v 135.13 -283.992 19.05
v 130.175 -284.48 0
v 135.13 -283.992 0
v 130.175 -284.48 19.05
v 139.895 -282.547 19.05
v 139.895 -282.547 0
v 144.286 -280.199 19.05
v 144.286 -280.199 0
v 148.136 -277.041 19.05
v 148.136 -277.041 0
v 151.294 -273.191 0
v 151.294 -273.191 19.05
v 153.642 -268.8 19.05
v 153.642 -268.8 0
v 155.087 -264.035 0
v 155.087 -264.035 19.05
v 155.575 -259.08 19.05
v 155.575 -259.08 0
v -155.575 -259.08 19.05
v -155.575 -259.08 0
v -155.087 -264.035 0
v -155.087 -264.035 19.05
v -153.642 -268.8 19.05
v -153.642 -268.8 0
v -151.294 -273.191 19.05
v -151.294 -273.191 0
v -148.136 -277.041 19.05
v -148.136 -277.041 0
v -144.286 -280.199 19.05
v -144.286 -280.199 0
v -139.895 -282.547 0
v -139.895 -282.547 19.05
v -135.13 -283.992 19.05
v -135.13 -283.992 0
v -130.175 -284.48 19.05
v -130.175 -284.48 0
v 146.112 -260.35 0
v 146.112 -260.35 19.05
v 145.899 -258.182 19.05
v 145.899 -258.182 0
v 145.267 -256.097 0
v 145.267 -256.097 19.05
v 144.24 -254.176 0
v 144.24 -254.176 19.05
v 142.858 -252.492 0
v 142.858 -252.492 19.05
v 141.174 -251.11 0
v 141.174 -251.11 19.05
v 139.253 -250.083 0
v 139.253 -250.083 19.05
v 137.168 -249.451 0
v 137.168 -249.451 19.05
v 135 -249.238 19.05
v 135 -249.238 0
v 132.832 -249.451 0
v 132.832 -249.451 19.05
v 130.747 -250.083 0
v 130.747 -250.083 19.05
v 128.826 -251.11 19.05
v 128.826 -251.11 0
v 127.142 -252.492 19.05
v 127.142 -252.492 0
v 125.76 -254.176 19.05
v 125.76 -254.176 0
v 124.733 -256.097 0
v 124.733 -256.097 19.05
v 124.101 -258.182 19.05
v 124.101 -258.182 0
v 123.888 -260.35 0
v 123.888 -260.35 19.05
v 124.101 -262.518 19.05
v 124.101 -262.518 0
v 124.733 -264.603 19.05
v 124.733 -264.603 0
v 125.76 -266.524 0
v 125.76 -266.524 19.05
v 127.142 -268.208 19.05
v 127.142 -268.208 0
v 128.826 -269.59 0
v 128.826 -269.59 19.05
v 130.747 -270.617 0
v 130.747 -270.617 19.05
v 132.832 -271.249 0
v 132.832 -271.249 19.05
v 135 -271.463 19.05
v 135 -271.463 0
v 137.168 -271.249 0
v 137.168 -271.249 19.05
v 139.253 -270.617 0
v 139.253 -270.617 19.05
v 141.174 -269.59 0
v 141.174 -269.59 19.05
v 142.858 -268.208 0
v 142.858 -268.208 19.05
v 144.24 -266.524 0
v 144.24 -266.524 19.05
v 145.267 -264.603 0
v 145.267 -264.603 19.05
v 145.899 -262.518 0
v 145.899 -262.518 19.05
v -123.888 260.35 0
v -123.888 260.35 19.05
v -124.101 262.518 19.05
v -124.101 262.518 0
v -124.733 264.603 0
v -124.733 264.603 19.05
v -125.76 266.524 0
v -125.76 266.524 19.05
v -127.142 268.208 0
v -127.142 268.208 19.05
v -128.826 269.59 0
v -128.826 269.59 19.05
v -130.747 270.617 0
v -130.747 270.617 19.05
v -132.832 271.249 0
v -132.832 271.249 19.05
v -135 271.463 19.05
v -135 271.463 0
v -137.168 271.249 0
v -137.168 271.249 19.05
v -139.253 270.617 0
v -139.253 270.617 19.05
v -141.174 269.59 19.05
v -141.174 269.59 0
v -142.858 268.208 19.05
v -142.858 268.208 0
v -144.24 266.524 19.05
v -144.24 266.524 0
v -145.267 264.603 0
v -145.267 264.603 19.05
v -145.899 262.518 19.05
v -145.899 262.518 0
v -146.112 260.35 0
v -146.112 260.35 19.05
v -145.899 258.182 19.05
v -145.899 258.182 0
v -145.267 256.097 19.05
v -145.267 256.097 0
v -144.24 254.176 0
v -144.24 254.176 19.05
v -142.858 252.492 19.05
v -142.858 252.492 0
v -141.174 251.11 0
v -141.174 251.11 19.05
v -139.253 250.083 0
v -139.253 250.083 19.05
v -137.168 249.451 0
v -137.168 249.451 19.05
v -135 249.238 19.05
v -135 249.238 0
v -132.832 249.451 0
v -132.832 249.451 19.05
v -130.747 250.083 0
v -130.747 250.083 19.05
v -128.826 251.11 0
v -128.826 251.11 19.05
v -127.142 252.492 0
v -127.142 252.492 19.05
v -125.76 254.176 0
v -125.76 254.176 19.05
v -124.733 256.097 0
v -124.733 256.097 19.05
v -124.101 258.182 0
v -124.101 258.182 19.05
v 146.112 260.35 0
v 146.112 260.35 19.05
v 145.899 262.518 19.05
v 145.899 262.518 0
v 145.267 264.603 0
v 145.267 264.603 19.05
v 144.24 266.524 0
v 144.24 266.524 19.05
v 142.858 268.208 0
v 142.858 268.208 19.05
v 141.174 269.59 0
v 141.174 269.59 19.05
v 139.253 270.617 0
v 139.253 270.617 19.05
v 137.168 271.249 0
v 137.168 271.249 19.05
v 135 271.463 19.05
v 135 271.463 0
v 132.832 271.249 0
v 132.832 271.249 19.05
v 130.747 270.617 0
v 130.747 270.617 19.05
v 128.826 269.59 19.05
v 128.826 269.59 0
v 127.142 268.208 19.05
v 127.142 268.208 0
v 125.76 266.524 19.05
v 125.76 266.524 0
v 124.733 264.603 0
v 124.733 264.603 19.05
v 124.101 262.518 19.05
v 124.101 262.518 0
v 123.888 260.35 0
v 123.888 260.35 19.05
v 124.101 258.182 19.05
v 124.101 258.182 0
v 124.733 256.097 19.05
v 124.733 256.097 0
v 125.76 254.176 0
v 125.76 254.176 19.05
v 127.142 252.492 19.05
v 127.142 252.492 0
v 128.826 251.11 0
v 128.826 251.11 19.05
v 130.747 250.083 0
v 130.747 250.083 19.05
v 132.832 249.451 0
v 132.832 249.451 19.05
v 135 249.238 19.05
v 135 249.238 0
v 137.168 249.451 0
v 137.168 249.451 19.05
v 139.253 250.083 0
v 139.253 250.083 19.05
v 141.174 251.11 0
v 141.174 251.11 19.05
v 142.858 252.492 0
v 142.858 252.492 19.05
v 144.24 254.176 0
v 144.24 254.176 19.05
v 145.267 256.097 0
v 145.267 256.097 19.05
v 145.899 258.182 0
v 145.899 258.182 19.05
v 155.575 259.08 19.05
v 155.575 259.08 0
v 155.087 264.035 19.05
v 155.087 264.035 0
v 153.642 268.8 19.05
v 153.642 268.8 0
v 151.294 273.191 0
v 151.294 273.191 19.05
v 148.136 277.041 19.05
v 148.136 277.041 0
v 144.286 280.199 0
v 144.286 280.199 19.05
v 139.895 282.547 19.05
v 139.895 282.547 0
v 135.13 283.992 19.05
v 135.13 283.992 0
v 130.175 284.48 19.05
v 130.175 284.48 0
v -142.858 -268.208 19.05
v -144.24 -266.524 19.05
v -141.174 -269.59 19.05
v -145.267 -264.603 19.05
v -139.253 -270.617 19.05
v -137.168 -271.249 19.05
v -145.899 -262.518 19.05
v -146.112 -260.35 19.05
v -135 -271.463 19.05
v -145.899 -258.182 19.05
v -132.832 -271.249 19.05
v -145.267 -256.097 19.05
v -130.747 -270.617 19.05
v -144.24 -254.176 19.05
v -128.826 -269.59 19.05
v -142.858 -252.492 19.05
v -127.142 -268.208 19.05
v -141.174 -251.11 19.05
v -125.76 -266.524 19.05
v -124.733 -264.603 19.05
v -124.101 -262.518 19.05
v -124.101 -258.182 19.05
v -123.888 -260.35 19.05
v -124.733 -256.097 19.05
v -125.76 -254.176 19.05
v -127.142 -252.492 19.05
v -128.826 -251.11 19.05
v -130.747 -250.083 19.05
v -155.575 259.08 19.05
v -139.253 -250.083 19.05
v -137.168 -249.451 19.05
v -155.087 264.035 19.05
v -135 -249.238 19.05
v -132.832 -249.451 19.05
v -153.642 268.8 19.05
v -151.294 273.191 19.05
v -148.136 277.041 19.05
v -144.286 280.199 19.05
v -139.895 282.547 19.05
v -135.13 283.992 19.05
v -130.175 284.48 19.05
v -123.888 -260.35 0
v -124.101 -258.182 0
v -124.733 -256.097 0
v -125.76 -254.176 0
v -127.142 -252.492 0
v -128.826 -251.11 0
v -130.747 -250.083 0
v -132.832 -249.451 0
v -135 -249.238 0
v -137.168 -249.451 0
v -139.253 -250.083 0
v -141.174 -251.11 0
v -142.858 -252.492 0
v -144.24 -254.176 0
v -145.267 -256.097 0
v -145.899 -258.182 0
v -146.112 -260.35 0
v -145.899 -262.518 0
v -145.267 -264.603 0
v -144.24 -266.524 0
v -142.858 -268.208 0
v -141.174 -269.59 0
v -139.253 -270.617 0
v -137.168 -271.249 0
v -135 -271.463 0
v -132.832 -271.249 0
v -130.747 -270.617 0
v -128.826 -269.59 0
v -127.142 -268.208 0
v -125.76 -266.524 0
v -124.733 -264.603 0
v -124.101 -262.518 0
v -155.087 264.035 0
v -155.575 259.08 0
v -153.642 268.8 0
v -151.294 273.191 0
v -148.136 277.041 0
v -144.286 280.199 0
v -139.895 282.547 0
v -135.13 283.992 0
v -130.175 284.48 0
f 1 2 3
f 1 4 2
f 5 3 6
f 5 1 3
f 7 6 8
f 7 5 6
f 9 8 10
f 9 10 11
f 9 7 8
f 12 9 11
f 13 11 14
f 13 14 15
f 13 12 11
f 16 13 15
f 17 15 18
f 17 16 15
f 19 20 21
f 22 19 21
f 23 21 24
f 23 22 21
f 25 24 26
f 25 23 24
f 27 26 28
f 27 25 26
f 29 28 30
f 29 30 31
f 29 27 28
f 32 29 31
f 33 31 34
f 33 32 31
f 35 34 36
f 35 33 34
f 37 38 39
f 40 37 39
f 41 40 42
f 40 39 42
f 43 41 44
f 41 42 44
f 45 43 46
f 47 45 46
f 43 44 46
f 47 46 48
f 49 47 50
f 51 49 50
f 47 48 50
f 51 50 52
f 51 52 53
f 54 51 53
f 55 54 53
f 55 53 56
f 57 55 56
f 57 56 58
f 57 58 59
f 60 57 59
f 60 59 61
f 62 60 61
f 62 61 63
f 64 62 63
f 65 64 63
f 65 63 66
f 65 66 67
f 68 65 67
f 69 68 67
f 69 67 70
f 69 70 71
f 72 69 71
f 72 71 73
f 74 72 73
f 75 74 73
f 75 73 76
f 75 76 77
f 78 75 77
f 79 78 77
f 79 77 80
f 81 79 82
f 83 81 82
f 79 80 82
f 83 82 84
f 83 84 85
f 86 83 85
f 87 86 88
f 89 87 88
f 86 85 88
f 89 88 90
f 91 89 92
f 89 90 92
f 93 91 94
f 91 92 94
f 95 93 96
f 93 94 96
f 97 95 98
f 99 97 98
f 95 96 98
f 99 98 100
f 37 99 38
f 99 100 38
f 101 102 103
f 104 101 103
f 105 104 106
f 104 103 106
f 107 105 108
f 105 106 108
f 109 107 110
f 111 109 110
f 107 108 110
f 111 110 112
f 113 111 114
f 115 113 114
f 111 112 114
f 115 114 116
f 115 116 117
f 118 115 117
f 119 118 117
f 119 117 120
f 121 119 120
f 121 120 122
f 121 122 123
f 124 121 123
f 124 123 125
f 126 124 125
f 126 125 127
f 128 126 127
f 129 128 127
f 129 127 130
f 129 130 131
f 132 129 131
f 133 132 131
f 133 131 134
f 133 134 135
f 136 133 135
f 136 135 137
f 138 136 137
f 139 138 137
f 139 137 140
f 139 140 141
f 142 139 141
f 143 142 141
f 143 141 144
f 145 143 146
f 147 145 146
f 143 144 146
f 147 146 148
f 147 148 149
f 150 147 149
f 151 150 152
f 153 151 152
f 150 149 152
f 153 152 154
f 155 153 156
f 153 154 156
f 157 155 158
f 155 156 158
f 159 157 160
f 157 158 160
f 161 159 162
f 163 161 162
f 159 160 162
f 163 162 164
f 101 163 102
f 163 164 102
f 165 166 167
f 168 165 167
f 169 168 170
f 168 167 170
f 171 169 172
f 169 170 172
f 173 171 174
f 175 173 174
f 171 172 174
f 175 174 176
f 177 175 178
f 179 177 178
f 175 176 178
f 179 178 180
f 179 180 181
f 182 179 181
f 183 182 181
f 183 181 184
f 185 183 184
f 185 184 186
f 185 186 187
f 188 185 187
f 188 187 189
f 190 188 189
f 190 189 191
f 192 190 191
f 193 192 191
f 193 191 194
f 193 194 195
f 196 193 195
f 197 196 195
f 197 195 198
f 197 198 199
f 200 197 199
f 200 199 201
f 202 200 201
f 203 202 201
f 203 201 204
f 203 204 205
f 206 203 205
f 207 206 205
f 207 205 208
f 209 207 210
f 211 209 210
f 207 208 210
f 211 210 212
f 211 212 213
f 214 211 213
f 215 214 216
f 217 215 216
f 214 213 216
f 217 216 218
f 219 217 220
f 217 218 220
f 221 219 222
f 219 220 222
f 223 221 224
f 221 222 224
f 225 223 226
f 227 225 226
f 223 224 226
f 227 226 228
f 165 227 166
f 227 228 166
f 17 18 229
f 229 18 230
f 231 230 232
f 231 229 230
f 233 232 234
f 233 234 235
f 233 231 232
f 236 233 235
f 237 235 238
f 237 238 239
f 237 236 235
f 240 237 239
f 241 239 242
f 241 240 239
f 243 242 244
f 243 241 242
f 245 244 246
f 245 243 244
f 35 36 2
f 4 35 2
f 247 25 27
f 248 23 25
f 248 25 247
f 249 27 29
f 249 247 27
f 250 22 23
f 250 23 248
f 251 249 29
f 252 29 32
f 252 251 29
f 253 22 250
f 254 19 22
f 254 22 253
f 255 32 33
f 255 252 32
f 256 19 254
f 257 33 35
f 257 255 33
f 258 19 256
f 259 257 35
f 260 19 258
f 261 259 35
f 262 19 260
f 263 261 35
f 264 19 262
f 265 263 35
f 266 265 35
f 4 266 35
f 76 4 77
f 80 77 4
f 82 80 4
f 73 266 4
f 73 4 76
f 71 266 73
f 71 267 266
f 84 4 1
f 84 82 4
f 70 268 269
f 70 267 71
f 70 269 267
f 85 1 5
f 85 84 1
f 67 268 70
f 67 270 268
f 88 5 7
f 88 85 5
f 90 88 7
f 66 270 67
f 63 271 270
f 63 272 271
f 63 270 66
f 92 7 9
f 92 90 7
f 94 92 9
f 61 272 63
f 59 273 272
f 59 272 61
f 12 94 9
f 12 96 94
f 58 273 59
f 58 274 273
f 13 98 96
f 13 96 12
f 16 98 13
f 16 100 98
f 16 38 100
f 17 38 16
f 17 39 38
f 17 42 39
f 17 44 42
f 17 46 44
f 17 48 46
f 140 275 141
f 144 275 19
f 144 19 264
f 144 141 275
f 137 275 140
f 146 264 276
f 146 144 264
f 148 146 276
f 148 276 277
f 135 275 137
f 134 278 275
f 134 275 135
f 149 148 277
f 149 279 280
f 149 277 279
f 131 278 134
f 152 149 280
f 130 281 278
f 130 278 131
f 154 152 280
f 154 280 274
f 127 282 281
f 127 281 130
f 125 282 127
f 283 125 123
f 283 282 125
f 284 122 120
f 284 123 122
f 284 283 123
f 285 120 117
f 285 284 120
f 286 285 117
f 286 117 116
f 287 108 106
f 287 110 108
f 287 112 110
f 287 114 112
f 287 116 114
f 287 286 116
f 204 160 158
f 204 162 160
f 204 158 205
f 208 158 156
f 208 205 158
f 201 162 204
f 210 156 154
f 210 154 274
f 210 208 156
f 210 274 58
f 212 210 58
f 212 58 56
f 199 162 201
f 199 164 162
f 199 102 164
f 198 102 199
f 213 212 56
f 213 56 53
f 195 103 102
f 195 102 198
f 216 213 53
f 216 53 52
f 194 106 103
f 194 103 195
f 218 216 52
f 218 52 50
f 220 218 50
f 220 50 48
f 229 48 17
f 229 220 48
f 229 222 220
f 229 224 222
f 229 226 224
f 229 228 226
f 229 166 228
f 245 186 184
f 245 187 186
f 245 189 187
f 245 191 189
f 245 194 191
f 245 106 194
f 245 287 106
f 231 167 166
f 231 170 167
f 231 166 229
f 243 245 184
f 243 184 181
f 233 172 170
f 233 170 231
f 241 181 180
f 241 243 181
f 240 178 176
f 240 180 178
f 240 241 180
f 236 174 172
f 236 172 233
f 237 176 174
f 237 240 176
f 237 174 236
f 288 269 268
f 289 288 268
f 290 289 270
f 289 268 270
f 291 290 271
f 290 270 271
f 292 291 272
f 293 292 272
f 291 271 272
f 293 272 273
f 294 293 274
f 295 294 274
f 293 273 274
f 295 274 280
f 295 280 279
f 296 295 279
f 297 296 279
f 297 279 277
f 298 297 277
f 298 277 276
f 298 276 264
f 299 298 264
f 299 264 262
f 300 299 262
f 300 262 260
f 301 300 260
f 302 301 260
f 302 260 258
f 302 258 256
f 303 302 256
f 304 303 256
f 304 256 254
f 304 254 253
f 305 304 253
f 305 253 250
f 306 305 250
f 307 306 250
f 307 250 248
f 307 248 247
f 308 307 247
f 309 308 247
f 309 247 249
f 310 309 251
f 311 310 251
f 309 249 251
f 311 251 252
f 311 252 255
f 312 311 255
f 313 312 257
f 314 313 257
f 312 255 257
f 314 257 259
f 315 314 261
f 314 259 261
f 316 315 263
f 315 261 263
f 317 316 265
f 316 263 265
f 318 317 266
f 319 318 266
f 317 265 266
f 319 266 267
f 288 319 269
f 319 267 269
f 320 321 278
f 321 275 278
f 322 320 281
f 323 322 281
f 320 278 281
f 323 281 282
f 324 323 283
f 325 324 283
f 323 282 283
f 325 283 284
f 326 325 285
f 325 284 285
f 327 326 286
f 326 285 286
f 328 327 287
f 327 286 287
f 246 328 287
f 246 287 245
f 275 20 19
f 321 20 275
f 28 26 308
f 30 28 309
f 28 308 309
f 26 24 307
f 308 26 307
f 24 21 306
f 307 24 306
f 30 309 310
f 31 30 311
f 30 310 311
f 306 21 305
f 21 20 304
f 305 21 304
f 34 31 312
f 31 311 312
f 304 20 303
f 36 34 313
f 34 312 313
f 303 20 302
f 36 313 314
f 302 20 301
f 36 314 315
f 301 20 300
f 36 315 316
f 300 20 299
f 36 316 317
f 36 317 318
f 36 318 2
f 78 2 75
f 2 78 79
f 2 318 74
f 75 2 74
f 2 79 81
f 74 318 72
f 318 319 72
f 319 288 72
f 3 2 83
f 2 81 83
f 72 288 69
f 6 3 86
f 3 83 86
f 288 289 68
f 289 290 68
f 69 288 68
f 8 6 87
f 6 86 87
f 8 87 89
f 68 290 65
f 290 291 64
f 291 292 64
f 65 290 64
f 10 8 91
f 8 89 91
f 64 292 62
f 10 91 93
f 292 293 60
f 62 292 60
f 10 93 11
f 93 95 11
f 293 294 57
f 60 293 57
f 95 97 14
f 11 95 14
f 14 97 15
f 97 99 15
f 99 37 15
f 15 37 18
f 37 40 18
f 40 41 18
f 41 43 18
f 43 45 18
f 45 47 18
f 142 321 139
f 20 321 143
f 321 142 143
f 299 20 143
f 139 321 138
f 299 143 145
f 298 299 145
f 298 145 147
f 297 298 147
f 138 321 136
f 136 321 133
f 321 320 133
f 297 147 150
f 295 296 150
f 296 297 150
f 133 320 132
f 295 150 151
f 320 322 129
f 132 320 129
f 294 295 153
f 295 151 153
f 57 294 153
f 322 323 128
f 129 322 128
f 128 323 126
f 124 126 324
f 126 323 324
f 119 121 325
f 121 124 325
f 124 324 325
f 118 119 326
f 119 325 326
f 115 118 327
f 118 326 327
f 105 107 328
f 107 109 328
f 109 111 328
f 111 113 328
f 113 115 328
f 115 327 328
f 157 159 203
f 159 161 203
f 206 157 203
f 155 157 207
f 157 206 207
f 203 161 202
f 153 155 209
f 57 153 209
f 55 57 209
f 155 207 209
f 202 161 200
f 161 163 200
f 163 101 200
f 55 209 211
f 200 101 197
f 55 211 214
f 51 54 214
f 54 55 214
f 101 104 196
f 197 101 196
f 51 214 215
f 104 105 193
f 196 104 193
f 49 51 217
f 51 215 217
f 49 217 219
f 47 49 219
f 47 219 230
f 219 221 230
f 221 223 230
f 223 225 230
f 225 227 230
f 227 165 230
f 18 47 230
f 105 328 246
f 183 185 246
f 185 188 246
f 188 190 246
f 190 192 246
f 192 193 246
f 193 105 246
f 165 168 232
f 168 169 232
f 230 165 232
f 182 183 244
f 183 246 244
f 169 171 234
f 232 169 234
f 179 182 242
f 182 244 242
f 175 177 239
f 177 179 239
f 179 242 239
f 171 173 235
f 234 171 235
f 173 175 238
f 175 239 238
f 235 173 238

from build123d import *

# Parameters (mm, degrees)
F0_W     = 311.15
F0_H     = 568.96
F1_DEPTH = 19.05
F3_R     = 25.4
F2_R     = 11.1125
F4_DEPTH = 19.051


with BuildPart() as f1:
    # F0 (on Top) → F1 (new body)
    with BuildSketch(Plane.XY):
        Rectangle(F0_W, F0_H)
    extrude(amount=F1_DEPTH)

    # F3
    f3_edges = [f1.edges().sort_by_distance(p)[0] for p in [
        (155.575, -284.48, 9.525),
        (-155.575, -284.48, 9.525),
        (-155.575, 284.48, 9.525),
        (155.575, 284.48, 9.525),
    ]]
    fillet(f3_edges, radius=F3_R)

    # F2 (on face) → F4 (cut, through all)
    with BuildSketch(Plane.XY.offset(19.05)):
        with Locations((-135, 260.35)):
            Circle(F2_R)
        with Locations((135, 260.35)):
            Circle(F2_R)
        with Locations((135, -260.35)):
            Circle(F2_R)
        with Locations((-135, -260.35)):
            Circle(F2_R)
    extrude(amount=-F4_DEPTH, mode=Mode.SUBTRACT)


solid = f1.part
